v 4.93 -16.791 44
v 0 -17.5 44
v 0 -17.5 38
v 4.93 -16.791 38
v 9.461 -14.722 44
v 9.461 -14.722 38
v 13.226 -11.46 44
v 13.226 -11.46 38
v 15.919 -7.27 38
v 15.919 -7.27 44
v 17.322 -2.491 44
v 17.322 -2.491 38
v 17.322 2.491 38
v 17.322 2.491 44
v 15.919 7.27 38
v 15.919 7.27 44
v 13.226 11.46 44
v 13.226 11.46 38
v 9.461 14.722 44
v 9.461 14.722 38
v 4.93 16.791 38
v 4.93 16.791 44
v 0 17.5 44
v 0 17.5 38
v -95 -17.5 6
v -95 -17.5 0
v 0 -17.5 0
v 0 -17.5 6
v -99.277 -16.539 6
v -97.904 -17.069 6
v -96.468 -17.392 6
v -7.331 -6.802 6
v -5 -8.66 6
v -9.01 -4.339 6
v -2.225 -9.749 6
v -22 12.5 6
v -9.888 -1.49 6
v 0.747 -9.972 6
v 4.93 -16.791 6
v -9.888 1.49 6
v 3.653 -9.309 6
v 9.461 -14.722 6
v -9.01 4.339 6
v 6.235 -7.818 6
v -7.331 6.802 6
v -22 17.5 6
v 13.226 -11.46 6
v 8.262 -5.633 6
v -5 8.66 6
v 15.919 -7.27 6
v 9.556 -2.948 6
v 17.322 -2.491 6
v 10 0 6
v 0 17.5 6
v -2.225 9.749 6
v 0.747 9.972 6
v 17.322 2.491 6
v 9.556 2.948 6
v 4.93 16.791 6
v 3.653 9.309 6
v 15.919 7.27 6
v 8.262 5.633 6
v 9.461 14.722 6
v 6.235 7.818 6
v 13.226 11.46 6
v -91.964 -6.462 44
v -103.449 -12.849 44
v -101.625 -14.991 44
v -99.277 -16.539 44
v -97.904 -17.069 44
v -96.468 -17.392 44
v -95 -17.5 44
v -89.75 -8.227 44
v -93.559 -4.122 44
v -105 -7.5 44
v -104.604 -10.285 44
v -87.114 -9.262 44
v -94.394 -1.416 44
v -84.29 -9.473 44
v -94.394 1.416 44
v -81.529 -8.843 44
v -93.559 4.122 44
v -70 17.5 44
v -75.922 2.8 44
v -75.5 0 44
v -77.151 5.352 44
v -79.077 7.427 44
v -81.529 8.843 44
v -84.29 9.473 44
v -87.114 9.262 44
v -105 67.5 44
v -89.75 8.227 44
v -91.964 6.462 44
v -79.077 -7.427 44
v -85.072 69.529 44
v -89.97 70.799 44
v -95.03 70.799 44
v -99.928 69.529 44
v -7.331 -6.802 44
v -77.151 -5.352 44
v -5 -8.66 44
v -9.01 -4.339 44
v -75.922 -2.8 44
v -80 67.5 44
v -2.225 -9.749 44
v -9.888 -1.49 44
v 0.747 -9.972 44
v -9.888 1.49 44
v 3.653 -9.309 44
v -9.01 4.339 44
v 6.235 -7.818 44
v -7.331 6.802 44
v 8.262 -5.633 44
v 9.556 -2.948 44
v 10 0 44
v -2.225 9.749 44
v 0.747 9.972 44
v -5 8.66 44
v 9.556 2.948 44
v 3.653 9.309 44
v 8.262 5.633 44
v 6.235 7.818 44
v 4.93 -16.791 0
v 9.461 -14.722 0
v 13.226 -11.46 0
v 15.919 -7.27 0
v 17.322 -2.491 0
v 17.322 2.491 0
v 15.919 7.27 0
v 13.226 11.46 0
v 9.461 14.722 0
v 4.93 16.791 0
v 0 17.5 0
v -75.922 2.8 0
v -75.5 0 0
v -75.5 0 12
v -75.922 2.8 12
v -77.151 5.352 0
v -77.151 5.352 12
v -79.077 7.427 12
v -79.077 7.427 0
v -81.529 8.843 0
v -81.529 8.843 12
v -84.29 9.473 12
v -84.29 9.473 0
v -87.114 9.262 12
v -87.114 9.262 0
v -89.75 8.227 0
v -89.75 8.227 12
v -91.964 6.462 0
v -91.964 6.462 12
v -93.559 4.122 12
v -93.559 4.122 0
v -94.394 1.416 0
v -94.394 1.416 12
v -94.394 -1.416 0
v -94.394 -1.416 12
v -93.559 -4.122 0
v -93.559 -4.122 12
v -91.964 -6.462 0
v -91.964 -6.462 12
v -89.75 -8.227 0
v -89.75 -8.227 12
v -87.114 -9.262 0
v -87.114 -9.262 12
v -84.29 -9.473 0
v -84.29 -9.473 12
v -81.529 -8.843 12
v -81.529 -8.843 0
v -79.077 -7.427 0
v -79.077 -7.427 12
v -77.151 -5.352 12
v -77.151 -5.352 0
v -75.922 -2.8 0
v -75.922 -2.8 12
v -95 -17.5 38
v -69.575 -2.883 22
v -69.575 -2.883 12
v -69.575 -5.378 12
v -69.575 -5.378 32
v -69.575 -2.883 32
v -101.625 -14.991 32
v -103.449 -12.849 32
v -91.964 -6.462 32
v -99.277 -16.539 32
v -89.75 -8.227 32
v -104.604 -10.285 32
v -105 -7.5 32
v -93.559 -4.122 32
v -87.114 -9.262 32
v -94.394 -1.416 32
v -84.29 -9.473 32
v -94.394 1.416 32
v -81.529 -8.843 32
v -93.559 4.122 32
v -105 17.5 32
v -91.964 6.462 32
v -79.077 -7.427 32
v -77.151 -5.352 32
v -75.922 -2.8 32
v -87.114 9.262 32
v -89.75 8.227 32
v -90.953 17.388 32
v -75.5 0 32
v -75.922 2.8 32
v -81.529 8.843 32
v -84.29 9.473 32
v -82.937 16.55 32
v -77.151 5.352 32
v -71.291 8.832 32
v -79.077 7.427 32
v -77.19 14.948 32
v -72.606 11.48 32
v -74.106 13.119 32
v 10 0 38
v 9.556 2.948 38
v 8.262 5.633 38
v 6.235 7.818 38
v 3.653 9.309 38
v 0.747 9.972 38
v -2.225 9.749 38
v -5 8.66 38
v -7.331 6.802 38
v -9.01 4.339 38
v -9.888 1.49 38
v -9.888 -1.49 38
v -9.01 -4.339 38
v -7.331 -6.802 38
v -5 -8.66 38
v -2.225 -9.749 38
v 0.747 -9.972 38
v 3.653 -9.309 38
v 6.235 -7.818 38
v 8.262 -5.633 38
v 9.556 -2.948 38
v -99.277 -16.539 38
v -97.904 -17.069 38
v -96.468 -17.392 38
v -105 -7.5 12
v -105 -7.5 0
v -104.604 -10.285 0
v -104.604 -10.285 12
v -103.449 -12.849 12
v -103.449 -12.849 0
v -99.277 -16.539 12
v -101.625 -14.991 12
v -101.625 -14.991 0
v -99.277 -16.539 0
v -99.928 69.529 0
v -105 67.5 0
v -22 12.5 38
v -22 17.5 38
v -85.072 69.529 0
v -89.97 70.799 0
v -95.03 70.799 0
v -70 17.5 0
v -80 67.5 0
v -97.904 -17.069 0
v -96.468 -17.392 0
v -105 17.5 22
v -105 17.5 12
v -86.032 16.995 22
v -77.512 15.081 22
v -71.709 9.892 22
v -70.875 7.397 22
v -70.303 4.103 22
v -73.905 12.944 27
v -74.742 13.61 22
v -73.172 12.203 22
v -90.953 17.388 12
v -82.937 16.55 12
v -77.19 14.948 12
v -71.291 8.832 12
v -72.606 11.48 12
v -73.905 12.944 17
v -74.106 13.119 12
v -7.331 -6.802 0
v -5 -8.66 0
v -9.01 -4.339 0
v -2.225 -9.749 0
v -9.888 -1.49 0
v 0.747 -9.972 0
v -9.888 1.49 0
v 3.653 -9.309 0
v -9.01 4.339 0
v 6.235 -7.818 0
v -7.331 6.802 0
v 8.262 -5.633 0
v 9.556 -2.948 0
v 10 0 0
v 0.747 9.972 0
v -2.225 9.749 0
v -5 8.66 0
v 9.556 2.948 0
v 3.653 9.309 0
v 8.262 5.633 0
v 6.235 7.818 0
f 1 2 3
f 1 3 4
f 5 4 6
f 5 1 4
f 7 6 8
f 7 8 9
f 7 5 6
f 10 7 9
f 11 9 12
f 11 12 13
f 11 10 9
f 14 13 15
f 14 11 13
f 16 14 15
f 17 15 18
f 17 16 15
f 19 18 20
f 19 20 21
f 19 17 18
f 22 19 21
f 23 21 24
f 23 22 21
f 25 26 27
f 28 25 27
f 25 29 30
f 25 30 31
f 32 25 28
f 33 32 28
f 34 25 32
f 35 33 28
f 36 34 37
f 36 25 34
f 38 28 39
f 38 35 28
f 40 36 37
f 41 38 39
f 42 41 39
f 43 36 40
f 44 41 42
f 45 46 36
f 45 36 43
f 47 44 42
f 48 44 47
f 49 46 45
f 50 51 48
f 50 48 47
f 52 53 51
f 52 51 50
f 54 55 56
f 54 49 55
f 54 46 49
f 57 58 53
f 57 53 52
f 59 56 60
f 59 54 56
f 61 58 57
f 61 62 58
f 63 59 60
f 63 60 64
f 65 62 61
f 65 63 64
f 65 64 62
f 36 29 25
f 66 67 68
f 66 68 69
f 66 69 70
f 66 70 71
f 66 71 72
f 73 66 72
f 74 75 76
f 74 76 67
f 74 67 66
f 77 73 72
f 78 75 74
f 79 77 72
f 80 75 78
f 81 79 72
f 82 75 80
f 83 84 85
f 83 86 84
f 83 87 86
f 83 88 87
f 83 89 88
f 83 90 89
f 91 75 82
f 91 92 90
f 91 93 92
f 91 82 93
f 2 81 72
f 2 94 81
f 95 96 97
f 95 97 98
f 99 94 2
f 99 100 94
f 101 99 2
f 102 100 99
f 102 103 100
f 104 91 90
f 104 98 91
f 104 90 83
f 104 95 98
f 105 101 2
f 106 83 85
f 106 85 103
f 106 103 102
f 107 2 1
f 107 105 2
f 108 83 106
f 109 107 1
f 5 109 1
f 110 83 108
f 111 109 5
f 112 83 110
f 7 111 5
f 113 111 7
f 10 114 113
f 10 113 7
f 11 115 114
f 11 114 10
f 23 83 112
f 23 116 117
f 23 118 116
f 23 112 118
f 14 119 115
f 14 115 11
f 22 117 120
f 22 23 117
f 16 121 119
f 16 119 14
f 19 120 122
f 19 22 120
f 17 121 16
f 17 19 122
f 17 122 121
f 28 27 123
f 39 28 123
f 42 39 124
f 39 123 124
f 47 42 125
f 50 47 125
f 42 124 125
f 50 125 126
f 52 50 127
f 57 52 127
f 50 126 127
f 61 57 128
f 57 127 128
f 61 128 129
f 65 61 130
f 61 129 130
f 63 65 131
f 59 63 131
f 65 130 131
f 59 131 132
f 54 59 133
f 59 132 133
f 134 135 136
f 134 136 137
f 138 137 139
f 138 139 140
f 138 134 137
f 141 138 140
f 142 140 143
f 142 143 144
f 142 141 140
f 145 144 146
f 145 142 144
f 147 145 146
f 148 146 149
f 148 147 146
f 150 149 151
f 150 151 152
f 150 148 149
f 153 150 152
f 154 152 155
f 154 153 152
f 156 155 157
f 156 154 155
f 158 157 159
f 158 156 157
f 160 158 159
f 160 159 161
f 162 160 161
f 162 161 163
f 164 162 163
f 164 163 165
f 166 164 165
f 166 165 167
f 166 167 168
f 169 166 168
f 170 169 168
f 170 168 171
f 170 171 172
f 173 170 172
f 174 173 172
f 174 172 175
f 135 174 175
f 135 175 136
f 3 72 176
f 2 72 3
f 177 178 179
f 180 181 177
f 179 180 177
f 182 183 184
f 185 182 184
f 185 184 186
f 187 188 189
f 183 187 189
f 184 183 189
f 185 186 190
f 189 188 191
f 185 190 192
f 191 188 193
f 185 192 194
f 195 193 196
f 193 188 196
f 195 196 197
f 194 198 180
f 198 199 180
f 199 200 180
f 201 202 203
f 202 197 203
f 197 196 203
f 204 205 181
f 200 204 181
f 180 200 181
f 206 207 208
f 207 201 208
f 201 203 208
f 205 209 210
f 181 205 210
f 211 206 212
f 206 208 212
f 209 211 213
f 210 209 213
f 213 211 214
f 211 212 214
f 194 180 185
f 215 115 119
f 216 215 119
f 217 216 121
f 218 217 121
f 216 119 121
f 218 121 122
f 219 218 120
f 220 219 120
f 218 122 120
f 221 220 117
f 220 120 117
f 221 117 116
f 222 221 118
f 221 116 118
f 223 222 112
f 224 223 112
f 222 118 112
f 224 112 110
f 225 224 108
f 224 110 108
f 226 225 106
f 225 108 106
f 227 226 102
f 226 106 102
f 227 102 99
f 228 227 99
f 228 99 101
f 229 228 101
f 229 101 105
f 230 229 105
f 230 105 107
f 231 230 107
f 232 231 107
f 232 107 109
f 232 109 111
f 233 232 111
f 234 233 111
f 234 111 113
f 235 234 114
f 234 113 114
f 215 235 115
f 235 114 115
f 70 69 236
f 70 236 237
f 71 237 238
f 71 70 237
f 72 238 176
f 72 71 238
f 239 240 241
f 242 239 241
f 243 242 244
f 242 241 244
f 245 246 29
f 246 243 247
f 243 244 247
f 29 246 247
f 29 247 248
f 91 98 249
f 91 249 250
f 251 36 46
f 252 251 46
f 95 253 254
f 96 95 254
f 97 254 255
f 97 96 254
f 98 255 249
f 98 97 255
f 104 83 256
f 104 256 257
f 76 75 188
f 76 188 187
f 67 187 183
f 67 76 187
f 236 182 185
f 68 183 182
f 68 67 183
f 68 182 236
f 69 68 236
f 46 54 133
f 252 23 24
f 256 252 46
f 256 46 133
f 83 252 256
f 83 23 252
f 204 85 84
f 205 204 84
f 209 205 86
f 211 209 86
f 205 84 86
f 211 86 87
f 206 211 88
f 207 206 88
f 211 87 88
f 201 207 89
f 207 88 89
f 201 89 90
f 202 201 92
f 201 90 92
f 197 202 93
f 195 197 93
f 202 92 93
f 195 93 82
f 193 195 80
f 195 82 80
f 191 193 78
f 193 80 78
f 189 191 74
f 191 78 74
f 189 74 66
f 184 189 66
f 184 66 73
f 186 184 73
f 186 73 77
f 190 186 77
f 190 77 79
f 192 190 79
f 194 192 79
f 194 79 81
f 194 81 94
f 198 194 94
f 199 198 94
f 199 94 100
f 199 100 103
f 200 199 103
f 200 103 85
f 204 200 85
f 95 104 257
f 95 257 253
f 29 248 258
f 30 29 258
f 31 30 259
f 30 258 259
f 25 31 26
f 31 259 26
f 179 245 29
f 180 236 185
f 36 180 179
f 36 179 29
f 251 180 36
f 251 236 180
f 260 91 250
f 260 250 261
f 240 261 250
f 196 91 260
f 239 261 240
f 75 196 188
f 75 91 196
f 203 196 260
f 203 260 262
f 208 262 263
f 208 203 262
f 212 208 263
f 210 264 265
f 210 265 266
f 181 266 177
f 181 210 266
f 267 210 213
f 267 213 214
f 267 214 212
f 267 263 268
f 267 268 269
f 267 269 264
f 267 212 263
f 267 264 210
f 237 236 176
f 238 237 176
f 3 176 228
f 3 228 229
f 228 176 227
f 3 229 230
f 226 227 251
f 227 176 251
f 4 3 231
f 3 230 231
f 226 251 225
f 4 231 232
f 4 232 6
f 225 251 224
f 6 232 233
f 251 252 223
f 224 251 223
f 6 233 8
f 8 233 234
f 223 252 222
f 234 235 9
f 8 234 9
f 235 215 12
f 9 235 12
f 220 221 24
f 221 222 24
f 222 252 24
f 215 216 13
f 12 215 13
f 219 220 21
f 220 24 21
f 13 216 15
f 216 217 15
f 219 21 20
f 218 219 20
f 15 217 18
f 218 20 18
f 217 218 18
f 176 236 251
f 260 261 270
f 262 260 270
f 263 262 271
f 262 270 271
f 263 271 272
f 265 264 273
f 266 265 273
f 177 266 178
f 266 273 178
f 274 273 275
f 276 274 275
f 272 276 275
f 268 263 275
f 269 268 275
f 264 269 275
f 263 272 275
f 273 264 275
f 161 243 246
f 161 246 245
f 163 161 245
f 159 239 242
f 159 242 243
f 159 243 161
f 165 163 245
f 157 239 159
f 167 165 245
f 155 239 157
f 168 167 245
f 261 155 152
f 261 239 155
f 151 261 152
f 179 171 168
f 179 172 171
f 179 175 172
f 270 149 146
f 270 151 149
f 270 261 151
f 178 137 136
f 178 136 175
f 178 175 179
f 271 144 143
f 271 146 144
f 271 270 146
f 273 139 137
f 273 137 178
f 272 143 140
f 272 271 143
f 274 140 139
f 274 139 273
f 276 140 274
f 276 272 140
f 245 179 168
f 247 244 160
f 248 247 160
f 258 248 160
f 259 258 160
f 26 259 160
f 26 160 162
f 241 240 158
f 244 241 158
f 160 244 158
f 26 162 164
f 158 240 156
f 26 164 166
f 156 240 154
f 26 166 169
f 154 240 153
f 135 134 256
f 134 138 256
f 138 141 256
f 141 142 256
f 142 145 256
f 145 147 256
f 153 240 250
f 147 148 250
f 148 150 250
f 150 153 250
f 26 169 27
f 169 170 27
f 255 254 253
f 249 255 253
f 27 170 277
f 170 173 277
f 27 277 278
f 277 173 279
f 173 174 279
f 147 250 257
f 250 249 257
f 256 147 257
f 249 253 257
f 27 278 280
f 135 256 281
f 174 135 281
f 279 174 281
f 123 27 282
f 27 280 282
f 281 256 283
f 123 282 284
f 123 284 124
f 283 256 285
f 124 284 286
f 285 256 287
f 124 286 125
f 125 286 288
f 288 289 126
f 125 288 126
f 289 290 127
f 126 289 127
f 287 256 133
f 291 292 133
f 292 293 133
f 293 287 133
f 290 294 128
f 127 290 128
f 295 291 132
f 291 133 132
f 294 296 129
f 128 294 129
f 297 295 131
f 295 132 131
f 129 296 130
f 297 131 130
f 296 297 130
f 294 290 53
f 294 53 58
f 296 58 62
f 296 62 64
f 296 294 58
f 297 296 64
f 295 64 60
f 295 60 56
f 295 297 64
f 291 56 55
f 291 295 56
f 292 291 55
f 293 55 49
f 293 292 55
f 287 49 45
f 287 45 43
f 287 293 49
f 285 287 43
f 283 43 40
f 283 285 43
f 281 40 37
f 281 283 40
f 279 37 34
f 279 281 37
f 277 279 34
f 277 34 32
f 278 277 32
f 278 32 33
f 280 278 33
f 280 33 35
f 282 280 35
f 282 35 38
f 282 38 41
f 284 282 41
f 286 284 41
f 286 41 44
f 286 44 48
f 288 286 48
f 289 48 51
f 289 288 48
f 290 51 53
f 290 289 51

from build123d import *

# Parameters (mm, degrees)
F0_R     = 10
F0_R_2   = 9.5
F1_DEPTH = 6
F2_DEPTH = 12
F3_DEPTH = 22


with BuildPart() as f1:
    # F0 (on Top) → F1 (new body)
    with BuildSketch(Plane.XY):
        with BuildLine():
            Line((-95, -17.5), (0, -17.5))
            ThreePointArc((0, -17.5), (17.5, 0), (0, 17.5))
            Line((0, 17.5), (-22, 17.5))
            Line((-22, 17.5), (-22, 12.5))
            Line((-22, 12.5), (-69.5748026423, -5.3779074195))
            Line((-69.5748026423, -5.3779074195), (-99.2765917217, -16.5394006021))
            ThreePointArc((-99.2765917217, -16.5394006021), (-97.1915740894, -17.2568951522), (-95, -17.5))
        make_face()
        Circle(F0_R, mode=Mode.SUBTRACT)
        with BuildLine():
            Line((-22, 12.5), (-22, 17.5))
            Line((-22, 17.5), (-70, 17.5))
            Line((-70, 17.5), (-80, 67.5))
            Line((-80, 67.5), (-105, 67.5))
            Line((-105, 67.5), (-105, 17.5))
            add(Edge.make_bspline(
                [(-105, 17.5), (-92.1195688134, 17.707814564), (-69.750044995, 17.565080001), (-70.398492672, 3.779775432), (-69.5748026423, -2.8830476028)],
                knots=[0, 0, 0, 0, 0.5805224933, 1, 1, 1, 1], degree=3))
            Line((-69.5748026423, -2.8830476028), (-69.5748026423, -5.3779074195))
            Line((-69.5748026423, -5.3779074195), (-22, 12.5))
        make_face()
        with BuildLine():
            ThreePointArc((-105, -7.5), (-103.4488436255, -12.8494898253), (-99.2765917217, -16.5394006021))
            Line((-99.2765917217, -16.5394006021), (-69.5748026423, -5.3779074195))
            Line((-69.5748026423, -5.3779074195), (-69.5748026423, -2.8830476028))
            add(Edge.make_bspline(
                [(-105, 17.5), (-92.1195688134, 17.707814564), (-69.750044995, 17.565080001), (-70.398492672, 3.779775432), (-69.5748026423, -2.8830476028)],
                knots=[0, 0, 0, 0, 0.5805224933, 1, 1, 1, 1], degree=3))
            Line((-105, 17.5), (-105, -7.5))
        make_face()
        with Locations((-85, 0)):
            Circle(F0_R_2, mode=Mode.SUBTRACT)
        with BuildLine():
            Line((-105, 67.5), (-80, 67.5))
            Line((-80, 67.5), (-85.0721864729, 69.5288745892))
            ThreePointArc((-85.0721864729, 69.5288745892), (-92.5, 70.9593407715), (-99.9278135271, 69.5288745892))
            Line((-99.9278135271, 69.5288745892), (-105, 67.5))
        make_face()
    extrude(amount=F1_DEPTH)

    # F0 (on Top) → F2 (join)
    with BuildSketch(Plane.XY):
        with BuildLine():
            ThreePointArc((-105, -7.5), (-103.4488436255, -12.8494898253), (-99.2765917217, -16.5394006021))
            Line((-99.2765917217, -16.5394006021), (-69.5748026423, -5.3779074195))
            Line((-69.5748026423, -5.3779074195), (-69.5748026423, -2.8830476028))
            add(Edge.make_bspline(
                [(-105, 17.5), (-92.1195688134, 17.707814564), (-69.750044995, 17.565080001), (-70.398492672, 3.779775432), (-69.5748026423, -2.8830476028)],
                knots=[0, 0, 0, 0, 0.5805224933, 1, 1, 1, 1], degree=3))
            Line((-105, 17.5), (-105, -7.5))
        make_face()
        with Locations((-85, 0)):
            Circle(F0_R_2, mode=Mode.SUBTRACT)
        with BuildLine():
            Line((-22, 12.5), (-22, 17.5))
            Line((-22, 17.5), (-70, 17.5))
            Line((-70, 17.5), (-80, 67.5))
            Line((-80, 67.5), (-105, 67.5))
            Line((-105, 67.5), (-105, 17.5))
            add(Edge.make_bspline(
                [(-105, 17.5), (-92.1195688134, 17.707814564), (-69.750044995, 17.565080001), (-70.398492672, 3.779775432), (-69.5748026423, -2.8830476028)],
                knots=[0, 0, 0, 0, 0.5805224933, 1, 1, 1, 1], degree=3))
            Line((-69.5748026423, -2.8830476028), (-69.5748026423, -5.3779074195))
            Line((-69.5748026423, -5.3779074195), (-22, 12.5))
        make_face()
        with BuildLine():
            Line((-105, 67.5), (-80, 67.5))
            Line((-80, 67.5), (-85.0721864729, 69.5288745892))
            ThreePointArc((-85.0721864729, 69.5288745892), (-92.5, 70.9593407715), (-99.9278135271, 69.5288745892))
            Line((-99.9278135271, 69.5288745892), (-105, 67.5))
        make_face()
    extrude(amount=F2_DEPTH)

    # F0 (on Top) → F3 (join)
    with BuildSketch(Plane.XY):
        with BuildLine():
            Line((-22, 12.5), (-22, 17.5))
            Line((-22, 17.5), (-70, 17.5))
            Line((-70, 17.5), (-80, 67.5))
            Line((-80, 67.5), (-105, 67.5))
            Line((-105, 67.5), (-105, 17.5))
            add(Edge.make_bspline(
                [(-105, 17.5), (-92.1195688134, 17.707814564), (-69.750044995, 17.565080001), (-70.398492672, 3.779775432), (-69.5748026423, -2.8830476028)],
                knots=[0, 0, 0, 0, 0.5805224933, 1, 1, 1, 1], degree=3))
            Line((-69.5748026423, -2.8830476028), (-69.5748026423, -5.3779074195))
            Line((-69.5748026423, -5.3779074195), (-22, 12.5))
        make_face()
        with BuildLine():
            Line((-105, 67.5), (-80, 67.5))
            Line((-80, 67.5), (-85.0721864729, 69.5288745892))
            ThreePointArc((-85.0721864729, 69.5288745892), (-92.5, 70.9593407715), (-99.9278135271, 69.5288745892))
            Line((-99.9278135271, 69.5288745892), (-105, 67.5))
        make_face()
    extrude(amount=F3_DEPTH)

    # F4: F1 across face


with BuildPart() as f1_1:
    add(f1.part)
    add(f1.part.mirror(Plane(origin=(-78.1474366436, 31.848252571, 22), x_dir=(1, 0, 0), z_dir=(0, 0, 1))))


solid = f1_1.part
